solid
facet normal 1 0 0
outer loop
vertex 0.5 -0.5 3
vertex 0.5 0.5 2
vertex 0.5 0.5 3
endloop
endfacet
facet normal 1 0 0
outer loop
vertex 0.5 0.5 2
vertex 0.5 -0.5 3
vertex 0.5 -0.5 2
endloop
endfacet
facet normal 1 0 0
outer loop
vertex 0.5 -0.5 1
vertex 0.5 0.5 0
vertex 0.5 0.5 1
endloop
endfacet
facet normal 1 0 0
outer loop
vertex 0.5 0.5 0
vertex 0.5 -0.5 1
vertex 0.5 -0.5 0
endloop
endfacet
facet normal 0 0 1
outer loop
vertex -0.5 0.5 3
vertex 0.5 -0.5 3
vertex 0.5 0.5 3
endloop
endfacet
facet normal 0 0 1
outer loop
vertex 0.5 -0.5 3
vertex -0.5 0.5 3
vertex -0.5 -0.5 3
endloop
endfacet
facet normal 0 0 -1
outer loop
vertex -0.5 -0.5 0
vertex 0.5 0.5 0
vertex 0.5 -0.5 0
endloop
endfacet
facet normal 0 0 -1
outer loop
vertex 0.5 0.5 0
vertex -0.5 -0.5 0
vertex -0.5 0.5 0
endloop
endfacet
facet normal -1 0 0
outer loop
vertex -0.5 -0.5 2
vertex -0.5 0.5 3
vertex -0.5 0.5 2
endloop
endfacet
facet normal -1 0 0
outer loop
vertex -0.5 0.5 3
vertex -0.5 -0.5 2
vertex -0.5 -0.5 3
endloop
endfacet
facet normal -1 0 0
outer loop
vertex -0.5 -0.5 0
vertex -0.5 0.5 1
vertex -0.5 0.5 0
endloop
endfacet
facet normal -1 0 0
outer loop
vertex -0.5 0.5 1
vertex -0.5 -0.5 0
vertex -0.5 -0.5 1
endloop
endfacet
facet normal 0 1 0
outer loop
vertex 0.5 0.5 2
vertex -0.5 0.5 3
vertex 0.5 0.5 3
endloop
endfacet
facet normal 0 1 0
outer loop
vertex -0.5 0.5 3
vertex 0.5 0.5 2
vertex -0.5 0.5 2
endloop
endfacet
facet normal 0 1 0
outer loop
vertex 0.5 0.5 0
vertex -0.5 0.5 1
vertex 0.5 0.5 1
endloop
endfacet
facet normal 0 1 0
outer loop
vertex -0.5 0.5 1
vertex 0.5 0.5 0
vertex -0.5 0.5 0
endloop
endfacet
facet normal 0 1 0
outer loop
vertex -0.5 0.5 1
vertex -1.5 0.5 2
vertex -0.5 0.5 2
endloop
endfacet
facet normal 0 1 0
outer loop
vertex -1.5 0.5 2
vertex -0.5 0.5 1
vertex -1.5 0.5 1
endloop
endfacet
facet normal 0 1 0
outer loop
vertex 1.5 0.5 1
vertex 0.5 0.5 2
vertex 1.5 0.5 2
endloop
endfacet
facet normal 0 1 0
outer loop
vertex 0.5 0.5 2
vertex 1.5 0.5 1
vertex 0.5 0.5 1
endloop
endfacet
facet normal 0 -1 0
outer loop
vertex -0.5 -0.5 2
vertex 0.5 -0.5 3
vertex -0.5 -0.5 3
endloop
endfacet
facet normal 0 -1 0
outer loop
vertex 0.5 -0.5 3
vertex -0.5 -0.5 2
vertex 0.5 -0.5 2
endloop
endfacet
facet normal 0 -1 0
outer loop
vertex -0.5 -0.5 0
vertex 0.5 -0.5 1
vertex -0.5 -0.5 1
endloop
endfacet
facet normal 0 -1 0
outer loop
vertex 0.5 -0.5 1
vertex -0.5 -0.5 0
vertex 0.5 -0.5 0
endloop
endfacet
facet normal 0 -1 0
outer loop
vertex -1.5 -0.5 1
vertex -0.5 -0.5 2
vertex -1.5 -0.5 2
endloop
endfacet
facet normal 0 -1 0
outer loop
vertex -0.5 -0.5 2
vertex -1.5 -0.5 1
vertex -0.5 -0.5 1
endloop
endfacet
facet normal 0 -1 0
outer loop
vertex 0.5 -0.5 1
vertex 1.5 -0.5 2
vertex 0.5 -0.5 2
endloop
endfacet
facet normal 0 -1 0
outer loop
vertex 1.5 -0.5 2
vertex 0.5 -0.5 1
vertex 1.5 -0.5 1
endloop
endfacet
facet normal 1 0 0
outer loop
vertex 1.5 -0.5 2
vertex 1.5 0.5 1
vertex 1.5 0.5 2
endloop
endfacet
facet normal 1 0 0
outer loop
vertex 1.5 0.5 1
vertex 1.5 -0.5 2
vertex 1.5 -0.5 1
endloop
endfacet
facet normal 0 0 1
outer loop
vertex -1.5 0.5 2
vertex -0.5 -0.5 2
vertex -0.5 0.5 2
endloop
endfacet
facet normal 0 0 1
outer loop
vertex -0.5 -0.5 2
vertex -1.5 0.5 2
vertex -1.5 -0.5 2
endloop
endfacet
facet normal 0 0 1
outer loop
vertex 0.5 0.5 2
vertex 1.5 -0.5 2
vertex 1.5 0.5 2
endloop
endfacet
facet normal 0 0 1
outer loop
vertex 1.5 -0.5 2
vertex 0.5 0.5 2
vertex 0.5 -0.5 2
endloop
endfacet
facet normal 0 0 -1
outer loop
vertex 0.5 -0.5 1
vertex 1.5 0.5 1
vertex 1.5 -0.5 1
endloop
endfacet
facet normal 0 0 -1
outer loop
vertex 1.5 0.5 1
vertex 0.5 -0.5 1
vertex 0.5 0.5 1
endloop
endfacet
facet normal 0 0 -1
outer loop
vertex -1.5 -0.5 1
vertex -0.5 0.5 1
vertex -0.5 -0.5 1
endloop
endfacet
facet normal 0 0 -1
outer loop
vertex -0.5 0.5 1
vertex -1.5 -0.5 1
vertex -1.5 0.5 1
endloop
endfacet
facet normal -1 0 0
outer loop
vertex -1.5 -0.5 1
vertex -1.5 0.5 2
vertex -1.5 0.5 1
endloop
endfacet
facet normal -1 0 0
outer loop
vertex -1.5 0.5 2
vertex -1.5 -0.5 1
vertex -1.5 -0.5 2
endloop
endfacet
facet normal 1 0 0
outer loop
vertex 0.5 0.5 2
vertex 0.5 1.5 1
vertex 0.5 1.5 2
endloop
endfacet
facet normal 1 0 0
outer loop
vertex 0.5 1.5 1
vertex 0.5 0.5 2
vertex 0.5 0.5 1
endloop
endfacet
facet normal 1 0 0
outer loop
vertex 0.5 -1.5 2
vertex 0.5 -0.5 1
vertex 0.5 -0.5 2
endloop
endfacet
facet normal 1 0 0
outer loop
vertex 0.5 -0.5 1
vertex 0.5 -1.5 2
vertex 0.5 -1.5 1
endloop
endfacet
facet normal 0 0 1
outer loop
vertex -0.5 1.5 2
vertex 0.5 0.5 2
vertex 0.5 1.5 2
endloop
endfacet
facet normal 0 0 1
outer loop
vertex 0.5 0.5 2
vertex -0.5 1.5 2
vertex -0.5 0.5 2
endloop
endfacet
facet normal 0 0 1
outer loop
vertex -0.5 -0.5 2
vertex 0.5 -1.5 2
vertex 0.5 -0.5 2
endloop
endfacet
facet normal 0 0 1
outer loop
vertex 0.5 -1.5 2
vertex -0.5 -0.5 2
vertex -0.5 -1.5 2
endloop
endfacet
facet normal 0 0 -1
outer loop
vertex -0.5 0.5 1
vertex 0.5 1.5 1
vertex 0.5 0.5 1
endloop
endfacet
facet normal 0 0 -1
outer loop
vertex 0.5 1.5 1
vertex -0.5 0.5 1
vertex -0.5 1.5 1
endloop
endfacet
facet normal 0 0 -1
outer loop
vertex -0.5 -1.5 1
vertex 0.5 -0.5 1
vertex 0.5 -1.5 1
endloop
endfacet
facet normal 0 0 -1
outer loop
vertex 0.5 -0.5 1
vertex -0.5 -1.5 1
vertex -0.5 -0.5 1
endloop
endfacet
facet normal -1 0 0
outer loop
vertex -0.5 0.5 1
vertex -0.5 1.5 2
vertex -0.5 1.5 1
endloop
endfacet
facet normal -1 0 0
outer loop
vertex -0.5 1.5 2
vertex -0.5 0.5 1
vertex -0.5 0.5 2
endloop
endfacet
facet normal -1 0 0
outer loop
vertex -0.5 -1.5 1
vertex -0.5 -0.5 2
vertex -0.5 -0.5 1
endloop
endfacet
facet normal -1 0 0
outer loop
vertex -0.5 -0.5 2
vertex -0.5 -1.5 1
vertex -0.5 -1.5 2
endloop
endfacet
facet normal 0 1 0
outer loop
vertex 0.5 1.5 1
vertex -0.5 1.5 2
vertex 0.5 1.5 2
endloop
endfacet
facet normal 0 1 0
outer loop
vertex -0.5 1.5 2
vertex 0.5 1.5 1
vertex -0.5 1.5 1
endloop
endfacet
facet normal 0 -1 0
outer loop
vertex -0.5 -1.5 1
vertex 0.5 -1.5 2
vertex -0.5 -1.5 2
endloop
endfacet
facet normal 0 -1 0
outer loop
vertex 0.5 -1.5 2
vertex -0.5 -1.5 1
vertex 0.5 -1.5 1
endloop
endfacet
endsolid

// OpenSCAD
color("Lime")
translate([-0.5,-0.5,0])
union(){
    cube([1,1,3]);
    translate([-1,0,1])
        cube([3,1,1]);
    translate([0,-1,1])
        cube([1,3,1]);
    }
